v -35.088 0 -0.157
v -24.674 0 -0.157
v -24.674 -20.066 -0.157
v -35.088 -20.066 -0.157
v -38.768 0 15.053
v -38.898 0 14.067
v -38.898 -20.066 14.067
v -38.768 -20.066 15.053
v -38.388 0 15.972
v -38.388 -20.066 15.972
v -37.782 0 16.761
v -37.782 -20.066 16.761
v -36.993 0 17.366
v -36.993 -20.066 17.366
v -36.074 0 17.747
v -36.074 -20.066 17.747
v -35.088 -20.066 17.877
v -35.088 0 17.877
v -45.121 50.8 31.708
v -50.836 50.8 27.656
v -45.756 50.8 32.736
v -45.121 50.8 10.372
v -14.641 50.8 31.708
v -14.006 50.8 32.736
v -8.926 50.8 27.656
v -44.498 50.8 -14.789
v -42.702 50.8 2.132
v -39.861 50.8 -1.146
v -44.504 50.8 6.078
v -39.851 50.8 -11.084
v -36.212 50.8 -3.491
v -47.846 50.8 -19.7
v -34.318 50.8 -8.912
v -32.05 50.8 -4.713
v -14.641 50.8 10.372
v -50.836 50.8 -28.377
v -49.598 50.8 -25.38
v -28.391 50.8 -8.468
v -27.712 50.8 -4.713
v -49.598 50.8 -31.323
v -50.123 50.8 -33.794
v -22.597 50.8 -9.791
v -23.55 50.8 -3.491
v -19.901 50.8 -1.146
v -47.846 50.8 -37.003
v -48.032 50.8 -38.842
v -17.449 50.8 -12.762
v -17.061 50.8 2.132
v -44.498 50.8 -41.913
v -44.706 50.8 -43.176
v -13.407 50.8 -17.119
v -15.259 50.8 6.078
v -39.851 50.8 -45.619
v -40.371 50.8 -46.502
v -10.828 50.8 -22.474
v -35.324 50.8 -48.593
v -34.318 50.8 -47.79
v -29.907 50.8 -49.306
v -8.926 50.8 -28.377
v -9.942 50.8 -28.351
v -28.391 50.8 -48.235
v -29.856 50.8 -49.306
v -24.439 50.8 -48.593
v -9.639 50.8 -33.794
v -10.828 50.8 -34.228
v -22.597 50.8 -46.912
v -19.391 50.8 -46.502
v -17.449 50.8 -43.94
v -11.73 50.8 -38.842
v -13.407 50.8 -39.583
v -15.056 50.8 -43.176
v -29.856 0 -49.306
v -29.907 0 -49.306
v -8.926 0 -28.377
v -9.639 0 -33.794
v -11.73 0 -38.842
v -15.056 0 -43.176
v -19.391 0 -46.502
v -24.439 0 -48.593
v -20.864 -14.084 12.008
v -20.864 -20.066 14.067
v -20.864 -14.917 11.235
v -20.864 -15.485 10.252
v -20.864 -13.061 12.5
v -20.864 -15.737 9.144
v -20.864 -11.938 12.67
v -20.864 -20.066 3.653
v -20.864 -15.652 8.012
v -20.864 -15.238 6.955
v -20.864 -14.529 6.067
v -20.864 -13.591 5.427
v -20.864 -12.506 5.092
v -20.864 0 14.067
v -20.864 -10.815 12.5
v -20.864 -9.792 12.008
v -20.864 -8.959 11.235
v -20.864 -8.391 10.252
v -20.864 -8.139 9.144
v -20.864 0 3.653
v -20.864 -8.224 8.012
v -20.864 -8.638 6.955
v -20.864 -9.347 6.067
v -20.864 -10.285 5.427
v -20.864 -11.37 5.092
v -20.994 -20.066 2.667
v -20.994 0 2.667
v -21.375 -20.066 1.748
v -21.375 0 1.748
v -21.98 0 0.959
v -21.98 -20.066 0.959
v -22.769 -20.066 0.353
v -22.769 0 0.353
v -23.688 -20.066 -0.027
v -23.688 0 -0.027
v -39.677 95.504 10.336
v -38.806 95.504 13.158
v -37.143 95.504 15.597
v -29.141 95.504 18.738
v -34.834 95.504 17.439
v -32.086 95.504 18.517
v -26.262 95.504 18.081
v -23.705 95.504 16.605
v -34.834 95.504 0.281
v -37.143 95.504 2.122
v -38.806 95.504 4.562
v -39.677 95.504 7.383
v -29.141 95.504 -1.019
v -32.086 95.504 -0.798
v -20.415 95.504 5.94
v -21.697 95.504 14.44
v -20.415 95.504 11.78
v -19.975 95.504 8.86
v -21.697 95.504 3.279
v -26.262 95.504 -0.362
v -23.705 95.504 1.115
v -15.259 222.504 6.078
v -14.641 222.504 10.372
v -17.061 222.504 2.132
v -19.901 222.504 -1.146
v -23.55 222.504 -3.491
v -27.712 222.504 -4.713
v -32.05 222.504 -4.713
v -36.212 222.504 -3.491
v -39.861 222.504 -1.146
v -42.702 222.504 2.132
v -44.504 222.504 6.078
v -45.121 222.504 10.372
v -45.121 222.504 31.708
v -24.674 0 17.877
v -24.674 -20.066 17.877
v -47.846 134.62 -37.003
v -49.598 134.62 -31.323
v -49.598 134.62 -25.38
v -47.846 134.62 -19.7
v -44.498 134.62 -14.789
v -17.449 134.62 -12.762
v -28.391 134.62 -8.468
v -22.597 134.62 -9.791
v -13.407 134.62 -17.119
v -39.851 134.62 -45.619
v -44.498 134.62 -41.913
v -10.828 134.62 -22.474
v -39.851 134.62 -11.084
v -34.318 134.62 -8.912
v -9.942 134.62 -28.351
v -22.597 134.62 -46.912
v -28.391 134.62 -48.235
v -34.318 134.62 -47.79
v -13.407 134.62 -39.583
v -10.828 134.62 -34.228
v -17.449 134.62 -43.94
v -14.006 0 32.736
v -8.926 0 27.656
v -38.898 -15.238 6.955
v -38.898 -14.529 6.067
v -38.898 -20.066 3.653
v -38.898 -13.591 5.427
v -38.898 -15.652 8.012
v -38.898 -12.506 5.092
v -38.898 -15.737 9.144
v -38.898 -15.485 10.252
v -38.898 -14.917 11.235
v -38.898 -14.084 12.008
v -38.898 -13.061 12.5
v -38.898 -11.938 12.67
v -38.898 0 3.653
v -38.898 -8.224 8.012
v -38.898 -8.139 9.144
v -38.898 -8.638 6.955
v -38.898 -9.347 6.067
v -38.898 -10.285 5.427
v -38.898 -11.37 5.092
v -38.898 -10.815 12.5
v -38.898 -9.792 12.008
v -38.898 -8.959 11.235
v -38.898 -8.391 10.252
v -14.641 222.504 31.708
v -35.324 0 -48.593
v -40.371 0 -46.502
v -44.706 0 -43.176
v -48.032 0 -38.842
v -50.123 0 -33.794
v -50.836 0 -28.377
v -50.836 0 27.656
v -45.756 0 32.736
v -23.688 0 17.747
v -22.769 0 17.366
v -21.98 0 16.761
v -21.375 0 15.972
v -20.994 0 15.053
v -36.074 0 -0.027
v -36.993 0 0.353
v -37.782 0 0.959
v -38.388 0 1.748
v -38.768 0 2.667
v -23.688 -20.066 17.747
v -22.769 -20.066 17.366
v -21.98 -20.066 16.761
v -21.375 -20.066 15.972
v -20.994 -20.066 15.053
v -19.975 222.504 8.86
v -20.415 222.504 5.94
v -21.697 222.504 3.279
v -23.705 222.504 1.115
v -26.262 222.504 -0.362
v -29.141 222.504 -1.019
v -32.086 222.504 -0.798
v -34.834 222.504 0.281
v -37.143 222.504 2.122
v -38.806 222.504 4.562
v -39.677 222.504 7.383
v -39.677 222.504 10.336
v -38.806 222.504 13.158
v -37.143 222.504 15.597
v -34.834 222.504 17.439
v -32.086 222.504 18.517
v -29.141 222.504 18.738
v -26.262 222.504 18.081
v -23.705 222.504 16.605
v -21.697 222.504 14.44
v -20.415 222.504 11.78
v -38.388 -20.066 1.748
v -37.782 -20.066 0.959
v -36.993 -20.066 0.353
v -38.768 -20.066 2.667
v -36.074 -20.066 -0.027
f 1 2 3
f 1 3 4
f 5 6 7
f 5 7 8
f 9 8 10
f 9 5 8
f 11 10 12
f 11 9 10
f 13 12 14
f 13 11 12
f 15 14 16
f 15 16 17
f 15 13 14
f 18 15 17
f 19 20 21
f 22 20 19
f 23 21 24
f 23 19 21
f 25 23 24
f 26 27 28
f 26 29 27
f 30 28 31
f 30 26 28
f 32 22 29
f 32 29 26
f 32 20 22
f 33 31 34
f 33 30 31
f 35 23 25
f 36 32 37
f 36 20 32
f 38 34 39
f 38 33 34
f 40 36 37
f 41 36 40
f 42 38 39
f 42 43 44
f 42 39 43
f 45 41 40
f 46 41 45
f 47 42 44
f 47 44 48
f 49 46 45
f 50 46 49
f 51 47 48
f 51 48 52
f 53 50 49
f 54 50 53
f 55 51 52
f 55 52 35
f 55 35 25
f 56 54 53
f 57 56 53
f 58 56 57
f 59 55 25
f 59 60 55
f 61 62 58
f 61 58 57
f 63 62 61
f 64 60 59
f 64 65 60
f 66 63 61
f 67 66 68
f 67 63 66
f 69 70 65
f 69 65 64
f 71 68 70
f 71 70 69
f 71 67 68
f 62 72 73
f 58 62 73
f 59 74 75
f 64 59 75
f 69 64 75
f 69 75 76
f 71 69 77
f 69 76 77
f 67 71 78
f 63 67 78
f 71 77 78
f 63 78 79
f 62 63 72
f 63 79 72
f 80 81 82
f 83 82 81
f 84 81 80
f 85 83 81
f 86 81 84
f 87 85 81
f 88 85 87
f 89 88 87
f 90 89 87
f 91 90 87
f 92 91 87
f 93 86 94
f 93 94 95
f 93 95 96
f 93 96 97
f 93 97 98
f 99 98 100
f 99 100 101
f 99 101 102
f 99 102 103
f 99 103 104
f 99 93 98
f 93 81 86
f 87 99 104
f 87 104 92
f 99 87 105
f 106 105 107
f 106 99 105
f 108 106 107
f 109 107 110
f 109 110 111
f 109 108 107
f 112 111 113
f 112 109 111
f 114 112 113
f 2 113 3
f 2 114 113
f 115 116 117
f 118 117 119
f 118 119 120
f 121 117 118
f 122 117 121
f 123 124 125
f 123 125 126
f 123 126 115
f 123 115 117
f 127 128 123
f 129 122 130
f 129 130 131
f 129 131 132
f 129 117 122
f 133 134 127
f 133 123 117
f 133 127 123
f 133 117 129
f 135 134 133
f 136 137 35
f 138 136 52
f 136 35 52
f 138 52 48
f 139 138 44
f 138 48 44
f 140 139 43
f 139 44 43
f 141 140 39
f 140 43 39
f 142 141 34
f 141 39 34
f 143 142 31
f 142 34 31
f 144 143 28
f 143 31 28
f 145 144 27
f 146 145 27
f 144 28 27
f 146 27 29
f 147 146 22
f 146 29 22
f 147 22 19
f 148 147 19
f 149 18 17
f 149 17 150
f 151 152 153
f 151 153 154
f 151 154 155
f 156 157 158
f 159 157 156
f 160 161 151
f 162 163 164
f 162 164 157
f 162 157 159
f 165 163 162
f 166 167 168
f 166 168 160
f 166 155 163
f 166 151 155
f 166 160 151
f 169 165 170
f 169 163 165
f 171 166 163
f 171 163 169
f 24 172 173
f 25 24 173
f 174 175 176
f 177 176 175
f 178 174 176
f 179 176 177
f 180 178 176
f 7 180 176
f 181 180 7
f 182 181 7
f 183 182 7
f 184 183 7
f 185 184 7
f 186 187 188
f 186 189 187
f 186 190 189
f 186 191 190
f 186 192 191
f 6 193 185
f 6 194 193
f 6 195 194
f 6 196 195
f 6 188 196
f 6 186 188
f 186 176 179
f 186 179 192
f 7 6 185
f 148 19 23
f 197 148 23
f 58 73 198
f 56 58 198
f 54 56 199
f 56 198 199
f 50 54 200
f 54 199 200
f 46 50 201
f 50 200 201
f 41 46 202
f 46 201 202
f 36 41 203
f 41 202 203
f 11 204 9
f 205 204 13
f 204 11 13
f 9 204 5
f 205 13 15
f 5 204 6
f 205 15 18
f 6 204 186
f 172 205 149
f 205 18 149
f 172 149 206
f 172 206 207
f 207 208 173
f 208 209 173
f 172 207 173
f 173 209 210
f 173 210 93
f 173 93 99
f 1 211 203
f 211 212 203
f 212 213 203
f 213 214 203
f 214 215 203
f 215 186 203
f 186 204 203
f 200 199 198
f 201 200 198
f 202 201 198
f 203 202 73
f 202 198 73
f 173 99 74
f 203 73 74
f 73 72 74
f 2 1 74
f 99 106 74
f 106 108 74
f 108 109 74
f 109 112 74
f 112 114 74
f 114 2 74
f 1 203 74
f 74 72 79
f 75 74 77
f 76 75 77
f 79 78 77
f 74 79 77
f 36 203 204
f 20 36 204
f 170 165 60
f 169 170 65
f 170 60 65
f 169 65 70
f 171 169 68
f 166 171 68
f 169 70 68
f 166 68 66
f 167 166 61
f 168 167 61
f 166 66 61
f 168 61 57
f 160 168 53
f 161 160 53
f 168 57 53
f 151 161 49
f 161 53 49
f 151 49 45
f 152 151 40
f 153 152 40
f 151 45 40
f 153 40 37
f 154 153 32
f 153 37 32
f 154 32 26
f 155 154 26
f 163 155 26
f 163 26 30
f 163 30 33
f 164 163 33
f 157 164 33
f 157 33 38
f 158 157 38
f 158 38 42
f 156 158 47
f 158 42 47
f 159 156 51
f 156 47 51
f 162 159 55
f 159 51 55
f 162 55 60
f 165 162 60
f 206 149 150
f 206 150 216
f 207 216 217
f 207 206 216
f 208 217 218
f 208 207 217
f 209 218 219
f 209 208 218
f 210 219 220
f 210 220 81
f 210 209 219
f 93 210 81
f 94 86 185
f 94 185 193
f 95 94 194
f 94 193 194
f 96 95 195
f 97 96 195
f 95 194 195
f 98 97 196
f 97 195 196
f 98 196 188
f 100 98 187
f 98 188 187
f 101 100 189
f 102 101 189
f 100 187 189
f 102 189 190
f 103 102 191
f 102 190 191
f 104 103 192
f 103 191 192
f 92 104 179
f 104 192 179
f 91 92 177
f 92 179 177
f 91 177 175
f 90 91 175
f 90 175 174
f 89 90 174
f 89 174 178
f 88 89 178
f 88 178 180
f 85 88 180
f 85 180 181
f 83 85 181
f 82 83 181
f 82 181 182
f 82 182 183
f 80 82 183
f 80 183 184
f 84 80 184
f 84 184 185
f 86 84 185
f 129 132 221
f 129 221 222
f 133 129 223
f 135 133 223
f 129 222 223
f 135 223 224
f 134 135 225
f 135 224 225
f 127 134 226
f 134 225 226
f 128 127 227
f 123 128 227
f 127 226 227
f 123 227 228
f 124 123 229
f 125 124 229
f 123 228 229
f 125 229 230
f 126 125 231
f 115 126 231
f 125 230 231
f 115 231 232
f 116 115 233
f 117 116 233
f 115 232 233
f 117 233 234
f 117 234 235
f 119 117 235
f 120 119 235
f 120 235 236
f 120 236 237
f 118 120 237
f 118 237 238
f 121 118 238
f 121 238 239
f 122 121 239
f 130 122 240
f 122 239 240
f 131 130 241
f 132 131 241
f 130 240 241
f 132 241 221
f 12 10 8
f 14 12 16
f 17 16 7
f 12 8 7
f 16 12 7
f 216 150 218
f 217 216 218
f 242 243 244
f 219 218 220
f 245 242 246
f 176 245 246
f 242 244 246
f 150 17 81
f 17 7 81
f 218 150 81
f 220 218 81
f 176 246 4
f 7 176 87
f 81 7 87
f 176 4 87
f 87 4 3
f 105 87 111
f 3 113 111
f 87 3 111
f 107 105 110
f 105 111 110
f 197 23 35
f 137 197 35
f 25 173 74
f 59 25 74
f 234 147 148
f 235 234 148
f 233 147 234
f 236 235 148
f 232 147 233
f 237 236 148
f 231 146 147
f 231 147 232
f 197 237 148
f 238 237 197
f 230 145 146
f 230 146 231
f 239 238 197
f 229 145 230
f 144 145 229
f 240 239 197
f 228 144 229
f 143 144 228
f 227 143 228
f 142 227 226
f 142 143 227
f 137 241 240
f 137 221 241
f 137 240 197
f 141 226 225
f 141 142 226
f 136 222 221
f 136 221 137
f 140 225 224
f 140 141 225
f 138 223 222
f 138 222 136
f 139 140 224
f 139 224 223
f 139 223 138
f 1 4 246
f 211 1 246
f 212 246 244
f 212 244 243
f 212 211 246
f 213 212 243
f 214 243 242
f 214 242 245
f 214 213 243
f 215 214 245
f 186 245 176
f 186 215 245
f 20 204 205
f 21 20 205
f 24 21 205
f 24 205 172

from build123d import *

# Parameters (mm, degrees)
BOSS_EXTRUDE1_DEPTH = 50.8
SKETCH2_R           = 19.939
BOSS_EXTRUDE2_DEPTH = 83.82
BOSS_EXTRUDE3_DEPTH = 171.704
BOSS_EXTRUDE4_DEPTH = 20.066
SKETCH5_R           = 3.81
CUT_EXTRUDE1_DEPTH  = 20.066
SKETCH6_R           = 9.906
CUT_EXTRUDE2_DEPTH  = 127


with BuildPart() as part:
    # Sketch1 → Boss-Extrude1 (new body)
    with BuildSketch(Plane(origin=(0, 0, 0), x_dir=(1, 0, 0), z_dir=(0, 1, 0))):
        with BuildLine():
            Line((-50.83623546, -27.655683544), (-45.75623546, -32.735683544))
            Line((-45.75623546, -32.735683544), (-14.00623546, -32.735683544))
            Line((-14.00623546, -32.735683544), (-8.92623546, -27.655683544))
            Line((-8.92623546, -27.655683544), (-8.92623546, 28.376716456))
            ThreePointArc((-8.92623546, 28.376716456), (-15.056373373, 43.176178544), (-29.85583546, 49.306316456))
            Line((-29.85583546, 49.306316456), (-29.90663546, 49.306316456))
            ThreePointArc((-29.90663546, 49.306316456), (-44.706097548, 43.176178544), (-50.83623546, 28.376716456))
            Line((-50.83623546, 28.376716456), (-50.83623546, -27.655683544))
        make_face()
    extrude(amount=BOSS_EXTRUDE1_DEPTH)

    # Sketch2 → Boss-Extrude2 (add)
    with BuildSketch(Plane(origin=(0, 50.8, 0), x_dir=(1, 0, 0), z_dir=(0, 1, 0))):
        with Locations((-29.88123546, 28.351316456)):
            Circle(SKETCH2_R)
    extrude(amount=BOSS_EXTRUDE2_DEPTH)

    # Sketch3 → Boss-Extrude3 (add)
    with BuildSketch(Plane(origin=(0, 50.8, 0), x_dir=(1, 0, 0), z_dir=(0, 1, 0))):
        with BuildLine():
            Line((-45.12123546, -31.707852889), (-14.64123546, -31.707852889))
            Line((-14.64123546, -31.707852889), (-14.64123546, -10.371852889))
            ThreePointArc((-14.64123546, -10.371852889), (-29.88123546, 4.868147111), (-45.12123546, -10.371852889))
            Line((-45.12123546, -10.371852889), (-45.12123546, -31.707852889))
        make_face()
    extrude(amount=BOSS_EXTRUDE3_DEPTH)

    # Sketch4 → Boss-Extrude4 (add)
    with BuildSketch(Plane(origin=(0, 0, 0), x_dir=(-1, 0, 0), z_dir=(0, -1, 0))):
        with BuildLine():
            Line((24.67423546, 0.157316456), (35.08823546, 0.157316456))
            ThreePointArc((35.08823546, 0.157316456), (37.782312297, -0.958606708), (38.89823546, -3.652683544))
            Line((38.89823546, -3.652683544), (38.89823546, -14.066683544))
            ThreePointArc((38.89823546, -14.066683544), (37.782312297, -16.76076038), (35.08823546, -17.876683544))
            Line((35.08823546, -17.876683544), (24.67423546, -17.876683544))
            ThreePointArc((24.67423546, -17.876683544), (21.980158624, -16.76076038), (20.86423546, -14.066683544))
            Line((20.86423546, -14.066683544), (20.86423546, -3.652683544))
            ThreePointArc((20.86423546, -3.652683544), (21.980158624, -0.958606708), (24.67423546, 0.157316456))
        make_face()
    extrude(amount=BOSS_EXTRUDE4_DEPTH)

    # Sketch5 → Cut-Extrude1 (cut)
    with BuildSketch(Plane.ZY.offset(38.89823546)):
        with Locations((8.859683544, -11.938)):
            Circle(SKETCH5_R)
    extrude(amount=-CUT_EXTRUDE1_DEPTH, mode=Mode.SUBTRACT)

    # Sketch6 → Cut-Extrude2 (cut)
    with BuildSketch(Plane(origin=(0, 222.504, 0), x_dir=(1, 0, 0), z_dir=(0, 1, 0))):
        with Locations((-29.88123546, -8.859683544)):
            Circle(SKETCH6_R)
    extrude(amount=-CUT_EXTRUDE2_DEPTH, mode=Mode.SUBTRACT)


solid = part.part
